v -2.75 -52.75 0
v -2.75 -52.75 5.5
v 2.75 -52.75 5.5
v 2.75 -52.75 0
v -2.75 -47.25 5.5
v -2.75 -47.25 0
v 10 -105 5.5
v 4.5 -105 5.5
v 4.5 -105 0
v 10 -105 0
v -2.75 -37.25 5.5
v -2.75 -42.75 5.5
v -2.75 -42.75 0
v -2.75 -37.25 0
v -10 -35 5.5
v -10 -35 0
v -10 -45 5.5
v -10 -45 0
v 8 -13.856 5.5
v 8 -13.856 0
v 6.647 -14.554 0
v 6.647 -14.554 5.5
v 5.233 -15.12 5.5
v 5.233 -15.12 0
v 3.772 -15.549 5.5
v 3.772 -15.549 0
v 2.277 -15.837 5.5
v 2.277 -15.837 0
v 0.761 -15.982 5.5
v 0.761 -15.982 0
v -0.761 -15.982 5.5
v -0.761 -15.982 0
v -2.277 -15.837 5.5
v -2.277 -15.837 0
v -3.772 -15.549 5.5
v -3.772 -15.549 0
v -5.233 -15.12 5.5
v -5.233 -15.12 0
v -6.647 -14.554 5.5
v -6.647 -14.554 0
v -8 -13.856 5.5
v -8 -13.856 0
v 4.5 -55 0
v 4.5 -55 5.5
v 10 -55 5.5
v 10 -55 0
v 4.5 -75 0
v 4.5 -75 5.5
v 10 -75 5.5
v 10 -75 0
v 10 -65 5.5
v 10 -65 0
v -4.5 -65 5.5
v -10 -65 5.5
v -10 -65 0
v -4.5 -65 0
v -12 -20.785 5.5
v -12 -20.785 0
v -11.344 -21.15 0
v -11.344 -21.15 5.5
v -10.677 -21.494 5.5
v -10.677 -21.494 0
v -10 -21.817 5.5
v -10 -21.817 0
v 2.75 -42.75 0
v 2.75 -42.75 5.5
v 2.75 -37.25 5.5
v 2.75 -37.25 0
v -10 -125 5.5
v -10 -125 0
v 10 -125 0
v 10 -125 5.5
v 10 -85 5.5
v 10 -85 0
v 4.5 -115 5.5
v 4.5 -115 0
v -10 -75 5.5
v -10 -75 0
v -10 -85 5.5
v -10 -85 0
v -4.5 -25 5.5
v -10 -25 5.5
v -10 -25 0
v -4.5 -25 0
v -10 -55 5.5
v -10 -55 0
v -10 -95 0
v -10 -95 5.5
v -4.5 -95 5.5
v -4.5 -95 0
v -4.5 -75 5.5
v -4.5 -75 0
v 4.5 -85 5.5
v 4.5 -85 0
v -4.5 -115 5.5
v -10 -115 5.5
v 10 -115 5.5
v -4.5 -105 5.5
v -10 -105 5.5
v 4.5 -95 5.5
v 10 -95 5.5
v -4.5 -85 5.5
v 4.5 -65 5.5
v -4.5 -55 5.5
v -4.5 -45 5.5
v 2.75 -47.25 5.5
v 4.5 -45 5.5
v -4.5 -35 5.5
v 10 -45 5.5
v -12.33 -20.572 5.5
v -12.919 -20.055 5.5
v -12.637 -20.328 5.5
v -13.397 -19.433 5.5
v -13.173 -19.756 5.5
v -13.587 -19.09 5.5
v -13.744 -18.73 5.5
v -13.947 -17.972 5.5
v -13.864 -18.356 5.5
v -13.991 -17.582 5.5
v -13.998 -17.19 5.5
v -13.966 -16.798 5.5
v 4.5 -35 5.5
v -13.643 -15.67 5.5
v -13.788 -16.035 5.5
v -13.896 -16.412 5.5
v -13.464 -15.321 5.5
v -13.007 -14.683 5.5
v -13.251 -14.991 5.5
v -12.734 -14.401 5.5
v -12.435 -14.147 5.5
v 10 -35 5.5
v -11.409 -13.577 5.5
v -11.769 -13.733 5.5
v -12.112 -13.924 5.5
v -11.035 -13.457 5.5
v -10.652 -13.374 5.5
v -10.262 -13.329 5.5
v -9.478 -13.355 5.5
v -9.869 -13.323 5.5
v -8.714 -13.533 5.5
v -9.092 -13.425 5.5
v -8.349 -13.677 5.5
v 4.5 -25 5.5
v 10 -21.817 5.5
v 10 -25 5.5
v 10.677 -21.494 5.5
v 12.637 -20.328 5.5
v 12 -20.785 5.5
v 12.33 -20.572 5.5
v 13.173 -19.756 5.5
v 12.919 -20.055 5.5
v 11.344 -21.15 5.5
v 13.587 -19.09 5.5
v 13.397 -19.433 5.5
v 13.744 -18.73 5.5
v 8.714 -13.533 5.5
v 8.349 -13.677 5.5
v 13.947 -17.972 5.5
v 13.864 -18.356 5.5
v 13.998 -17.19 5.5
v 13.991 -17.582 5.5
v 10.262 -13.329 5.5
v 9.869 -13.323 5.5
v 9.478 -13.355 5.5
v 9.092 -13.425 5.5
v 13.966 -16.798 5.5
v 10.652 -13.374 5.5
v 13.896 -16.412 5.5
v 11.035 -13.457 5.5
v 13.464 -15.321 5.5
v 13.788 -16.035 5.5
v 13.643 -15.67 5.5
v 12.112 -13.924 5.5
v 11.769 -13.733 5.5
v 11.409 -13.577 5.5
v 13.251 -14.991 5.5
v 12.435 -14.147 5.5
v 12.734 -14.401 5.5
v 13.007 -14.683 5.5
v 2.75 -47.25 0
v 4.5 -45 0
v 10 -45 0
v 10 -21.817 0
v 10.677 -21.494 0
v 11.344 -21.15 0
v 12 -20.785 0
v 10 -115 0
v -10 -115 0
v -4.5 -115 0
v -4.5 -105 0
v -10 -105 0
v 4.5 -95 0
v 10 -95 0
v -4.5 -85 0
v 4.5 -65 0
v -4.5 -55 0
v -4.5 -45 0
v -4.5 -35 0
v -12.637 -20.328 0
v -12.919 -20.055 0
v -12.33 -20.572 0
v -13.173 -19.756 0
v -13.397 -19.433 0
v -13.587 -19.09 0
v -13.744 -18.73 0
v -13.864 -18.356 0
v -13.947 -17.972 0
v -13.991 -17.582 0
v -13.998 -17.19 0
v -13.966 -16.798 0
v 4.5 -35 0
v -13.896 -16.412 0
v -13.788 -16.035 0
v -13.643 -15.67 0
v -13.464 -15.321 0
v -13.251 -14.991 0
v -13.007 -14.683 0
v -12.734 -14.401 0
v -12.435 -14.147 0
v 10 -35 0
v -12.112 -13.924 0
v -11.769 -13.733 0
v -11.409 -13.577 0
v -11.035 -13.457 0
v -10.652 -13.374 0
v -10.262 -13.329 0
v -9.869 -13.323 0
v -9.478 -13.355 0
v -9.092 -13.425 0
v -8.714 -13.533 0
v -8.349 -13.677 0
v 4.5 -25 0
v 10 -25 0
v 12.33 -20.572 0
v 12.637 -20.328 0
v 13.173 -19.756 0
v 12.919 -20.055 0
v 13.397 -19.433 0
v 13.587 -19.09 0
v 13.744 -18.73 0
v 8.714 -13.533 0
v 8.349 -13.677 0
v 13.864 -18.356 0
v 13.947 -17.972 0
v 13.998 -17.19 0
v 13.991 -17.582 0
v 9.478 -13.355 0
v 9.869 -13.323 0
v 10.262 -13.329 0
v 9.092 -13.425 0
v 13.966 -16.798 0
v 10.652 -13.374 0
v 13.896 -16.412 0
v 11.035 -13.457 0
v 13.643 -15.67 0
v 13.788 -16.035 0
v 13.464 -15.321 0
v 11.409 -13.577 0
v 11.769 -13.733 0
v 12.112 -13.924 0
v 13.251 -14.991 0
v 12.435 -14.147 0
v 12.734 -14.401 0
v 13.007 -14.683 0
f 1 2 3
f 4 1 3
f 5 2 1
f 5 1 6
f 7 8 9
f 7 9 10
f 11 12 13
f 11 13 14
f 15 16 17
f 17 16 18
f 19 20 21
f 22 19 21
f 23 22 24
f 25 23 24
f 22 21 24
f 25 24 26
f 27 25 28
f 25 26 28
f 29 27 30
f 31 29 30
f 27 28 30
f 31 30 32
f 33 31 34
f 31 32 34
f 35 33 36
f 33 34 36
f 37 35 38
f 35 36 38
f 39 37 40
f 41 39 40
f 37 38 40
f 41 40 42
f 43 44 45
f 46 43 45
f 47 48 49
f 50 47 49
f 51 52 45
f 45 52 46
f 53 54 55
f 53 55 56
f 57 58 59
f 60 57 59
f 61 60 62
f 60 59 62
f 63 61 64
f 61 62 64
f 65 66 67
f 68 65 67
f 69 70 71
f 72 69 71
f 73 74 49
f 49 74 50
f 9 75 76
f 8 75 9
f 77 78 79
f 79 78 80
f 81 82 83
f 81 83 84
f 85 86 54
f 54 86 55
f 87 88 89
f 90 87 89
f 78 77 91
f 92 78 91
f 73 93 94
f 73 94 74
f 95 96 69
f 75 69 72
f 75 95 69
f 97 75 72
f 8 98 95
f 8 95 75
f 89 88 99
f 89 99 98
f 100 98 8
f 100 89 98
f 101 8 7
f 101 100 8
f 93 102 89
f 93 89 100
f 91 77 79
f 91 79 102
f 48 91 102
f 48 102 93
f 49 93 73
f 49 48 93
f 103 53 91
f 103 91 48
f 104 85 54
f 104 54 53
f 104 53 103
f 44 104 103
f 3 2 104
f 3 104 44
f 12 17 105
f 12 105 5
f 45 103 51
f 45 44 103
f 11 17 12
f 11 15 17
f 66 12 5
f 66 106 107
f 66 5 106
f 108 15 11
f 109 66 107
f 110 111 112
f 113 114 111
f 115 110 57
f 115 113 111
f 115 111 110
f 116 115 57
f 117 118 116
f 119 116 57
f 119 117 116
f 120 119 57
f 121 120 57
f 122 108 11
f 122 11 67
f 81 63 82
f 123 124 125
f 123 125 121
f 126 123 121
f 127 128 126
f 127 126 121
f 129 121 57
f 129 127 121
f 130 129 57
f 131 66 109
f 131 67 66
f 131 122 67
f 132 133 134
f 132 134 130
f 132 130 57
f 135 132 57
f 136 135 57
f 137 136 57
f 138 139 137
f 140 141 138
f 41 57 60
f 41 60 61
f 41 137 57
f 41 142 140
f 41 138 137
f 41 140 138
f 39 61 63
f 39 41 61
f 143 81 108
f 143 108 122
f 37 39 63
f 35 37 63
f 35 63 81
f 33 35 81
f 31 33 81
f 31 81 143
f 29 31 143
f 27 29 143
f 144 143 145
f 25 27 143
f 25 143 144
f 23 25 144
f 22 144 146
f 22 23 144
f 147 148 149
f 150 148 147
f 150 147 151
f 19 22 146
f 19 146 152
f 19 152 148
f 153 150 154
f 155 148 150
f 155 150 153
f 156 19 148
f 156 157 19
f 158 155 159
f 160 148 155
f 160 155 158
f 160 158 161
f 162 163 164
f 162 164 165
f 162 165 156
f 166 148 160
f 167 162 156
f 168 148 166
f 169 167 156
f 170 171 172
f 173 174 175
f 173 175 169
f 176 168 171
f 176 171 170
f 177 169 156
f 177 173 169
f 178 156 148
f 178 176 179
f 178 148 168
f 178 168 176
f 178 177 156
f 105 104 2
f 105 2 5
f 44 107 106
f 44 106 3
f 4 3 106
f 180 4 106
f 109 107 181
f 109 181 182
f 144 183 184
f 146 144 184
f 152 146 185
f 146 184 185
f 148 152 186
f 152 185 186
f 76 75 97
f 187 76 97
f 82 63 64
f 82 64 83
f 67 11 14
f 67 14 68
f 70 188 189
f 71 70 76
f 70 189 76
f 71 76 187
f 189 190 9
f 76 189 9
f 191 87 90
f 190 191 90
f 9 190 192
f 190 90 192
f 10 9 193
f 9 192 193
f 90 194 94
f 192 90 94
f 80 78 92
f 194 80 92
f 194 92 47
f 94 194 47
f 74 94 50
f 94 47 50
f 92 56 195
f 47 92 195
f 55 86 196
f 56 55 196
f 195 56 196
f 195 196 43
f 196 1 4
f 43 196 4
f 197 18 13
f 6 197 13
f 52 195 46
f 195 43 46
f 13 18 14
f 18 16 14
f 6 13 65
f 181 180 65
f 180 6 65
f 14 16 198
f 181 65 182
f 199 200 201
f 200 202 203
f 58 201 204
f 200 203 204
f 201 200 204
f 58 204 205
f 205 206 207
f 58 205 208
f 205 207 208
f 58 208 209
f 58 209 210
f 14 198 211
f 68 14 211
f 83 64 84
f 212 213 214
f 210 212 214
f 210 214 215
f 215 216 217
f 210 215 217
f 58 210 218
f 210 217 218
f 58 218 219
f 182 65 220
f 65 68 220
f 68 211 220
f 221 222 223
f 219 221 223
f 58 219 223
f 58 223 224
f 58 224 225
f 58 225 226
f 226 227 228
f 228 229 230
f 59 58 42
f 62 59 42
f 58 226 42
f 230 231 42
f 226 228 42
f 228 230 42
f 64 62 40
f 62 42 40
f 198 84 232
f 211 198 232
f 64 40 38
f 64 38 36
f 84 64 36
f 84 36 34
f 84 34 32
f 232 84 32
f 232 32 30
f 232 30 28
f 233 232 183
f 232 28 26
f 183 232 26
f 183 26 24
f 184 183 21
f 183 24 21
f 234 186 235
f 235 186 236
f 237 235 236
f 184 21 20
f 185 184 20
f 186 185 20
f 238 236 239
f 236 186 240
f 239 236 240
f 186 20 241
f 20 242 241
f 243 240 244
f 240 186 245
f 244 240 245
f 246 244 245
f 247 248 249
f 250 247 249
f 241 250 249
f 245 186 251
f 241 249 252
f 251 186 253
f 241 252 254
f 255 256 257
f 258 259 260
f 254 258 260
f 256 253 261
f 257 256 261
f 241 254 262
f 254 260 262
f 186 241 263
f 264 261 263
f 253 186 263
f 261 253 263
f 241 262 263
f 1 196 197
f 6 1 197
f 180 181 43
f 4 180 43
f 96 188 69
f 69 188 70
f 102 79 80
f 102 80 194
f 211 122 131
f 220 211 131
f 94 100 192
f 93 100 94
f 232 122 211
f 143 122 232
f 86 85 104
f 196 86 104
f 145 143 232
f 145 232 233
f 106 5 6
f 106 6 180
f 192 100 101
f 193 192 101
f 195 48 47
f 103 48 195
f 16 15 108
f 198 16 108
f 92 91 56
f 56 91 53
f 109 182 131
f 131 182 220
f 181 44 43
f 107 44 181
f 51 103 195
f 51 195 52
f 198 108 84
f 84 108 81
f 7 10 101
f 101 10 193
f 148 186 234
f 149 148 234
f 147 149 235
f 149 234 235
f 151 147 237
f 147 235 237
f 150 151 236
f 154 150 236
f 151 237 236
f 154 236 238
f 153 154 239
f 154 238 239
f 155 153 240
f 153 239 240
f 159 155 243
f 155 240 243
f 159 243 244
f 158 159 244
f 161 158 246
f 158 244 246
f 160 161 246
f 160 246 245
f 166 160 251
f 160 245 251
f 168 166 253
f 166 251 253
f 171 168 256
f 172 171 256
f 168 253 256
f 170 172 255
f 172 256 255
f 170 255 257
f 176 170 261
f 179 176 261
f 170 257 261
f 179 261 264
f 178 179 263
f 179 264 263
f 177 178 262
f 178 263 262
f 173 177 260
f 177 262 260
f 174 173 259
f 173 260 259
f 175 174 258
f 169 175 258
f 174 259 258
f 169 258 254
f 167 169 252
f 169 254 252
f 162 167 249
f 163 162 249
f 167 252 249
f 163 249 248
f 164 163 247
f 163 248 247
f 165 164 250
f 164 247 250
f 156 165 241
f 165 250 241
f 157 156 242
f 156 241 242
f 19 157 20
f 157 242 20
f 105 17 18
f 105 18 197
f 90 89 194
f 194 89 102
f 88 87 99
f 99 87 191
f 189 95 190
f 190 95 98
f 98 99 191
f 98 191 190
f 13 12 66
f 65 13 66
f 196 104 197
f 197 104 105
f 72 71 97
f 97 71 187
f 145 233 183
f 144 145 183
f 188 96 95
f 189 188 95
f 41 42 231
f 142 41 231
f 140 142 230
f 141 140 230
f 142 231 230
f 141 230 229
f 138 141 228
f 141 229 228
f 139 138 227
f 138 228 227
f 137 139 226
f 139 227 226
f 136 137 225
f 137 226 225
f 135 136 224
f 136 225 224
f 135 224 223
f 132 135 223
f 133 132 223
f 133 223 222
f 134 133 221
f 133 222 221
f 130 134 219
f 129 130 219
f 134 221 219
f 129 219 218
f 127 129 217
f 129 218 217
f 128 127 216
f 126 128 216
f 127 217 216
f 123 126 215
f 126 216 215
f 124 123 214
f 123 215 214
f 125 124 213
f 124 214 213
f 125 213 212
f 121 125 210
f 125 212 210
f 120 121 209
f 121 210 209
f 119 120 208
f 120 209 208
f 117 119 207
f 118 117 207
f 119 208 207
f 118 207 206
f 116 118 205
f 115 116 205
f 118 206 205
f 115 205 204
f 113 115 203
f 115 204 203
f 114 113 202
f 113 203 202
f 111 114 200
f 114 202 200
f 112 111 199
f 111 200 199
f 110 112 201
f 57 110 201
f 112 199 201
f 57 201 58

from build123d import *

# Parameters (mm, degrees)
EXTRUDE_1_DEPTH     = 5.5
SKETCH_2_W          = 5.5
SKETCH_2_H          = 10
CUT_EXTRUDE_1_DEPTH = 126.901747406
SKETCH_5_W          = 5.5
SKETCH_5_H          = 5.5
CUT_EXTRUDE_2_DEPTH = 126.901747406


with BuildPart() as part:
    # ｽｹｯﾁ1 → ﾎﾞｽ - 押し出し1 (new body)
    with BuildSketch(Plane.XY):
        with BuildLine():
            Line((-10, -21.817424229), (-10, -125))
            Line((-10, -125), (10, -125))
            Line((10, -125), (10, -21.817424229))
            ThreePointArc((10, -21.817424229), (11.012114986, -21.324477099), (12, -20.784609691))
            ThreePointArc((12, -20.784609691), (13.464101615, -15.320508076), (8, -13.856406461))
            ThreePointArc((8, -13.856406461), (0, -16), (-8, -13.856406461))
            ThreePointArc((-8, -13.856406461), (-13.464101615, -15.320508076), (-12, -20.784609691))
            ThreePointArc((-12, -20.784609691), (-11.012114986, -21.324477099), (-10, -21.817424229))
        make_face()
    extrude(amount=EXTRUDE_1_DEPTH)

    # ｽｹｯﾁ2 → ｶｯﾄ - 押し出し1 (cut, through all)
    with BuildSketch(Plane.XY.offset(5.5)):
        with Locations((-7.25, -90)):
            Rectangle(SKETCH_2_W, SKETCH_2_H)
        with Locations((-7.25, -110)):
            Rectangle(SKETCH_2_W, SKETCH_2_H)
        with Locations((-7.25, -70)):
            Rectangle(SKETCH_2_W, SKETCH_2_H)
        with Locations((-7.25, -50)):
            Rectangle(SKETCH_2_W, SKETCH_2_H)
        with Locations((-7.25, -30)):
            Rectangle(SKETCH_2_W, SKETCH_2_H)
        with Locations((7.25, -110)):
            Rectangle(SKETCH_2_W, SKETCH_2_H)
        with Locations((7.25, -90)):
            Rectangle(SKETCH_2_W, SKETCH_2_H)
        with Locations((7.25, -70)):
            Rectangle(SKETCH_2_W, SKETCH_2_H)
        with Locations((7.25, -50)):
            Rectangle(SKETCH_2_W, SKETCH_2_H)
        with Locations((7.25, -30)):
            Rectangle(SKETCH_2_W, SKETCH_2_H)
    extrude(amount=-CUT_EXTRUDE_1_DEPTH, mode=Mode.SUBTRACT)

    # ｽｹｯﾁ5 → ｶｯﾄ - 押し出し2 (cut, through all)
    with BuildSketch(Plane.XY.offset(5.5)):
        with Locations((0, -40)):
            Rectangle(SKETCH_5_W, SKETCH_5_H)
        with Locations((0, -50)):
            Rectangle(SKETCH_5_W, SKETCH_5_H)
    extrude(amount=-CUT_EXTRUDE_2_DEPTH, mode=Mode.SUBTRACT)


solid = part.part
